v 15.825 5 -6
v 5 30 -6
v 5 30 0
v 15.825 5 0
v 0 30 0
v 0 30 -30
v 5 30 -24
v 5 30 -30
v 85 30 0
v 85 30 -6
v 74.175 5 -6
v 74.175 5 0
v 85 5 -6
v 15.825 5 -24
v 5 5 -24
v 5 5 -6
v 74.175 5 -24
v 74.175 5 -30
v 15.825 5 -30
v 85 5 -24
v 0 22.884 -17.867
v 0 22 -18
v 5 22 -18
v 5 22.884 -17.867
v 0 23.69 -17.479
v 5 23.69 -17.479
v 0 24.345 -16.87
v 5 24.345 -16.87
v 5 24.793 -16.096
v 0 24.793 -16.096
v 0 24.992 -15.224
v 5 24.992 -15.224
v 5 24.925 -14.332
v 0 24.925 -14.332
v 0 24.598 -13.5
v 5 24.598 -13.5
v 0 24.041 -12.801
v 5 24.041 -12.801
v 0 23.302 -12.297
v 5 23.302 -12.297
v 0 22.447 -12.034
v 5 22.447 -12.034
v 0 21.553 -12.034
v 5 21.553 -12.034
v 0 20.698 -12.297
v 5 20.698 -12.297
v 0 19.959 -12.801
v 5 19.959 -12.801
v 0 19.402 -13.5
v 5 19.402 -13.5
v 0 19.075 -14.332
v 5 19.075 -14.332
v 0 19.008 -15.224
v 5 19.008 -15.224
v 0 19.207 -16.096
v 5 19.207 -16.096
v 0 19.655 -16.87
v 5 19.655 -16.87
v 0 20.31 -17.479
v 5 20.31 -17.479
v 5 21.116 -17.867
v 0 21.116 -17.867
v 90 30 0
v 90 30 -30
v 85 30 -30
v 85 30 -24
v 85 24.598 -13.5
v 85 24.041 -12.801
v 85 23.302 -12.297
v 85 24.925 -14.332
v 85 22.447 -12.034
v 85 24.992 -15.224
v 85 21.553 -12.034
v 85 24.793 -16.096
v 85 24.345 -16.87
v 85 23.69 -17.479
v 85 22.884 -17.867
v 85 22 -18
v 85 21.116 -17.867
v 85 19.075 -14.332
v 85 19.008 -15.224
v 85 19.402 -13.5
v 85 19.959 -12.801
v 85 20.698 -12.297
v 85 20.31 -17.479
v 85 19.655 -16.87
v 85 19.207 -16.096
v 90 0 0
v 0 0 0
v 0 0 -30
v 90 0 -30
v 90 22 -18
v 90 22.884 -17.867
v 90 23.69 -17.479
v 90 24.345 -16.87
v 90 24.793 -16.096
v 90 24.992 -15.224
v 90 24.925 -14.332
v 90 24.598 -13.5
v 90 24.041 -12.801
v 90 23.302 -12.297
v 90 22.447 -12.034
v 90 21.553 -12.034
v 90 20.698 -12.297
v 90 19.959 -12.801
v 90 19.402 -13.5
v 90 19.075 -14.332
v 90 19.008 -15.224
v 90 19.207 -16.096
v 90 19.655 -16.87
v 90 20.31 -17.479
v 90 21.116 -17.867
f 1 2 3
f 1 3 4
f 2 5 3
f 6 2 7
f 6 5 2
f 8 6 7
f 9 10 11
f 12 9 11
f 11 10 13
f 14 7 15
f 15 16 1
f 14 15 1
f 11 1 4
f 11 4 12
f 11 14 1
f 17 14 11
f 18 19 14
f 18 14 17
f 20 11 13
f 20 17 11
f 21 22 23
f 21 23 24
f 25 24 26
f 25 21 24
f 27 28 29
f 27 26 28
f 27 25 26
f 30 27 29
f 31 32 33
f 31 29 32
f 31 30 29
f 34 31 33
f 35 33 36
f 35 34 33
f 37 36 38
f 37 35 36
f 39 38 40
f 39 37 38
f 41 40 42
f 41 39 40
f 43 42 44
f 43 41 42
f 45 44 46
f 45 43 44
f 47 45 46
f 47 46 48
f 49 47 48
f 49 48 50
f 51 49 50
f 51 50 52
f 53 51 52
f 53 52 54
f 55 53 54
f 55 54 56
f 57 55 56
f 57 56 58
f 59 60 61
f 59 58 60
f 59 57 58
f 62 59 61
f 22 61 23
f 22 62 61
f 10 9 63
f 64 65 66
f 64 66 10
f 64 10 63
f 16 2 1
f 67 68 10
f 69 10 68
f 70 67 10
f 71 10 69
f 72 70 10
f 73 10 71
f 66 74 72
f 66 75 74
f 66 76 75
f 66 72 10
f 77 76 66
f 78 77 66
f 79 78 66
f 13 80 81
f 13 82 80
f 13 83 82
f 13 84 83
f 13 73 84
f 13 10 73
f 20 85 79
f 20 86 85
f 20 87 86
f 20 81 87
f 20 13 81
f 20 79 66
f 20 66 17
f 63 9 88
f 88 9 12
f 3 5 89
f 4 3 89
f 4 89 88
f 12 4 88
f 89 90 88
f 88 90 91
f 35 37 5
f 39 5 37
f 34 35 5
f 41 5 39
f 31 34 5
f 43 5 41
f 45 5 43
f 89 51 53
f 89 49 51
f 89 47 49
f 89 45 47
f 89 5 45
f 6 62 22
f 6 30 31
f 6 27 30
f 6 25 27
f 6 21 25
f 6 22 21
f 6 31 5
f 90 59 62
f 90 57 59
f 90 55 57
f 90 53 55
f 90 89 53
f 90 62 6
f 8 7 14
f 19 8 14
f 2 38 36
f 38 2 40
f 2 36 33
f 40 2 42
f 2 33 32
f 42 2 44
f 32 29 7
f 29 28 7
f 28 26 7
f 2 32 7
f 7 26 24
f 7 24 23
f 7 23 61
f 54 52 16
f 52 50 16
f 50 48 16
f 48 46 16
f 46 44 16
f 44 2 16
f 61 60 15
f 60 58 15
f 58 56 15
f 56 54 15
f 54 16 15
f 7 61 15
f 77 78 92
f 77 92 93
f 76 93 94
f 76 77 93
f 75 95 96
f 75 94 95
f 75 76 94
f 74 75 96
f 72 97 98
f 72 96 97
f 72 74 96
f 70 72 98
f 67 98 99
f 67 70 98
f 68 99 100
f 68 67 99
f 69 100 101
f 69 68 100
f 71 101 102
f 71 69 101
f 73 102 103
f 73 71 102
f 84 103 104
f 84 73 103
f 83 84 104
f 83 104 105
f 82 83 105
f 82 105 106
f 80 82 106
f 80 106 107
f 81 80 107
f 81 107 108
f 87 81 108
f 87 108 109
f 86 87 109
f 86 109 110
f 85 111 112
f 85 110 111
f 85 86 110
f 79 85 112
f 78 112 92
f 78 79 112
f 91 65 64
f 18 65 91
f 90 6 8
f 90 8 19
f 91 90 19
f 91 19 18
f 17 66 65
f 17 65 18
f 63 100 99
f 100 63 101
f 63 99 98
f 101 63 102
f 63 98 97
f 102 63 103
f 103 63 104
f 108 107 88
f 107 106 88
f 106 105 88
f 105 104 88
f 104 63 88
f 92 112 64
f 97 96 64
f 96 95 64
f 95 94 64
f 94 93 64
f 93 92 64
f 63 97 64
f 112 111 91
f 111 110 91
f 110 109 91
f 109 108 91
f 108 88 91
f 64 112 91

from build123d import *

# Parameters (mm, degrees)
SKETCH1_W               = 90
SKETCH1_H               = 30
BOSS_EXTRUDE1_DEPTH     = 30
SHELL1_T                = -5
CUT_EXTRUDE1_DEPTH      = 100.498743711
CUT_EXTRUDE1_DEPTH_BACK = 100.498743711
SKETCH2_R               = 3
RIB1_REACH              = 101.499
SKETCH4_WALL_W          = 228.240511764
SKETCH4_WALL_H          = 6
MIRROR2_COPY_1_REACH    = 101.499
MIRROR2_COPY_1_SKETCH_W = 228.240511764
MIRROR2_COPY_1_SKETCH_H = 6


with BuildPart() as part:
    # Sketch1 → Boss-Extrude1 (new body)
    with BuildSketch(Plane(origin=(0, 0, 0), x_dir=(1, 0, 0), z_dir=(0, 1, 0))):
        with Locations((45, 15)):
            Rectangle(SKETCH1_W, SKETCH1_H)
    extrude(amount=BOSS_EXTRUDE1_DEPTH)

    # Shell1
    shell1_openings = [part.faces().sort_by_distance(p)[0] for p in [
        (45, 30, -15),
        (45, 15, -30),
        (45, 15, 0),
    ]]
    offset(amount=SHELL1_T, openings=shell1_openings, kind=Kind.INTERSECTION)

    # Sketch2 → Cut-Extrude1 (cut, two sides: drawn at the far end of the back side and taken through both)
    with BuildSketch(Plane(origin=(90, 0, 0), x_dir=(0, 0, -1), z_dir=(1, 0, 0)).offset(-CUT_EXTRUDE1_DEPTH_BACK)):
        with Locations((15, 22)):
            Circle(SKETCH2_R)
    extrude(amount=CUT_EXTRUDE1_DEPTH + CUT_EXTRUDE1_DEPTH_BACK, mode=Mode.SUBTRACT)

    # Sketch4 wall → Rib1 (add, up to next)
    with BuildSketch(Plane(origin=(10.412540423, 17.5, 0), x_dir=(0.397352390435, -0.917666103665, 0), z_dir=(0.917666103665, 0.397352390435, 0)), mode=Mode.PRIVATE) as rib1_sk1:
        with Locations((0, 3)):
            Rectangle(SKETCH4_WALL_W, SKETCH4_WALL_H)
    rib1_tool1 = extrude(rib1_sk1.sketch, amount=-RIB1_REACH, mode=Mode.PRIVATE) - part.part
    rib1 = rib1_tool1.solids().sort_by_distance((10.412540423, 17.5, 0))[0]
    add(rib1)

    # Mirror1: Rib1 across plane
    add(rib1.mirror(Plane(origin=(45, 0, 0), x_dir=(0, 0, 1), z_dir=(1, 0, 0))))

    # Mirror2: Rib1 across plane
    add(rib1.mirror(Plane.XY.offset(-15)))

    # Mirror2 copy 1 sketch → Mirror2 copy 1 (add, up to next)
    with BuildSketch(Plane(origin=(79.587459577, 17.5, -30), x_dir=(-0.397352390435, -0.917666103665, 0), z_dir=(-0.917666103665, 0.397352390435, 0)), mode=Mode.PRIVATE) as mirror2_copy_1_sk1:
        with Locations((0, 3)):
            Rectangle(MIRROR2_COPY_1_SKETCH_W, MIRROR2_COPY_1_SKETCH_H)
    mirror2_copy_1_tool1 = extrude(mirror2_copy_1_sk1.sketch, amount=-MIRROR2_COPY_1_REACH, mode=Mode.PRIVATE) - part.part
    add(mirror2_copy_1_tool1.solids().sort_by_distance((79.587459577, 17.5, -30))[0])


solid = part.part
